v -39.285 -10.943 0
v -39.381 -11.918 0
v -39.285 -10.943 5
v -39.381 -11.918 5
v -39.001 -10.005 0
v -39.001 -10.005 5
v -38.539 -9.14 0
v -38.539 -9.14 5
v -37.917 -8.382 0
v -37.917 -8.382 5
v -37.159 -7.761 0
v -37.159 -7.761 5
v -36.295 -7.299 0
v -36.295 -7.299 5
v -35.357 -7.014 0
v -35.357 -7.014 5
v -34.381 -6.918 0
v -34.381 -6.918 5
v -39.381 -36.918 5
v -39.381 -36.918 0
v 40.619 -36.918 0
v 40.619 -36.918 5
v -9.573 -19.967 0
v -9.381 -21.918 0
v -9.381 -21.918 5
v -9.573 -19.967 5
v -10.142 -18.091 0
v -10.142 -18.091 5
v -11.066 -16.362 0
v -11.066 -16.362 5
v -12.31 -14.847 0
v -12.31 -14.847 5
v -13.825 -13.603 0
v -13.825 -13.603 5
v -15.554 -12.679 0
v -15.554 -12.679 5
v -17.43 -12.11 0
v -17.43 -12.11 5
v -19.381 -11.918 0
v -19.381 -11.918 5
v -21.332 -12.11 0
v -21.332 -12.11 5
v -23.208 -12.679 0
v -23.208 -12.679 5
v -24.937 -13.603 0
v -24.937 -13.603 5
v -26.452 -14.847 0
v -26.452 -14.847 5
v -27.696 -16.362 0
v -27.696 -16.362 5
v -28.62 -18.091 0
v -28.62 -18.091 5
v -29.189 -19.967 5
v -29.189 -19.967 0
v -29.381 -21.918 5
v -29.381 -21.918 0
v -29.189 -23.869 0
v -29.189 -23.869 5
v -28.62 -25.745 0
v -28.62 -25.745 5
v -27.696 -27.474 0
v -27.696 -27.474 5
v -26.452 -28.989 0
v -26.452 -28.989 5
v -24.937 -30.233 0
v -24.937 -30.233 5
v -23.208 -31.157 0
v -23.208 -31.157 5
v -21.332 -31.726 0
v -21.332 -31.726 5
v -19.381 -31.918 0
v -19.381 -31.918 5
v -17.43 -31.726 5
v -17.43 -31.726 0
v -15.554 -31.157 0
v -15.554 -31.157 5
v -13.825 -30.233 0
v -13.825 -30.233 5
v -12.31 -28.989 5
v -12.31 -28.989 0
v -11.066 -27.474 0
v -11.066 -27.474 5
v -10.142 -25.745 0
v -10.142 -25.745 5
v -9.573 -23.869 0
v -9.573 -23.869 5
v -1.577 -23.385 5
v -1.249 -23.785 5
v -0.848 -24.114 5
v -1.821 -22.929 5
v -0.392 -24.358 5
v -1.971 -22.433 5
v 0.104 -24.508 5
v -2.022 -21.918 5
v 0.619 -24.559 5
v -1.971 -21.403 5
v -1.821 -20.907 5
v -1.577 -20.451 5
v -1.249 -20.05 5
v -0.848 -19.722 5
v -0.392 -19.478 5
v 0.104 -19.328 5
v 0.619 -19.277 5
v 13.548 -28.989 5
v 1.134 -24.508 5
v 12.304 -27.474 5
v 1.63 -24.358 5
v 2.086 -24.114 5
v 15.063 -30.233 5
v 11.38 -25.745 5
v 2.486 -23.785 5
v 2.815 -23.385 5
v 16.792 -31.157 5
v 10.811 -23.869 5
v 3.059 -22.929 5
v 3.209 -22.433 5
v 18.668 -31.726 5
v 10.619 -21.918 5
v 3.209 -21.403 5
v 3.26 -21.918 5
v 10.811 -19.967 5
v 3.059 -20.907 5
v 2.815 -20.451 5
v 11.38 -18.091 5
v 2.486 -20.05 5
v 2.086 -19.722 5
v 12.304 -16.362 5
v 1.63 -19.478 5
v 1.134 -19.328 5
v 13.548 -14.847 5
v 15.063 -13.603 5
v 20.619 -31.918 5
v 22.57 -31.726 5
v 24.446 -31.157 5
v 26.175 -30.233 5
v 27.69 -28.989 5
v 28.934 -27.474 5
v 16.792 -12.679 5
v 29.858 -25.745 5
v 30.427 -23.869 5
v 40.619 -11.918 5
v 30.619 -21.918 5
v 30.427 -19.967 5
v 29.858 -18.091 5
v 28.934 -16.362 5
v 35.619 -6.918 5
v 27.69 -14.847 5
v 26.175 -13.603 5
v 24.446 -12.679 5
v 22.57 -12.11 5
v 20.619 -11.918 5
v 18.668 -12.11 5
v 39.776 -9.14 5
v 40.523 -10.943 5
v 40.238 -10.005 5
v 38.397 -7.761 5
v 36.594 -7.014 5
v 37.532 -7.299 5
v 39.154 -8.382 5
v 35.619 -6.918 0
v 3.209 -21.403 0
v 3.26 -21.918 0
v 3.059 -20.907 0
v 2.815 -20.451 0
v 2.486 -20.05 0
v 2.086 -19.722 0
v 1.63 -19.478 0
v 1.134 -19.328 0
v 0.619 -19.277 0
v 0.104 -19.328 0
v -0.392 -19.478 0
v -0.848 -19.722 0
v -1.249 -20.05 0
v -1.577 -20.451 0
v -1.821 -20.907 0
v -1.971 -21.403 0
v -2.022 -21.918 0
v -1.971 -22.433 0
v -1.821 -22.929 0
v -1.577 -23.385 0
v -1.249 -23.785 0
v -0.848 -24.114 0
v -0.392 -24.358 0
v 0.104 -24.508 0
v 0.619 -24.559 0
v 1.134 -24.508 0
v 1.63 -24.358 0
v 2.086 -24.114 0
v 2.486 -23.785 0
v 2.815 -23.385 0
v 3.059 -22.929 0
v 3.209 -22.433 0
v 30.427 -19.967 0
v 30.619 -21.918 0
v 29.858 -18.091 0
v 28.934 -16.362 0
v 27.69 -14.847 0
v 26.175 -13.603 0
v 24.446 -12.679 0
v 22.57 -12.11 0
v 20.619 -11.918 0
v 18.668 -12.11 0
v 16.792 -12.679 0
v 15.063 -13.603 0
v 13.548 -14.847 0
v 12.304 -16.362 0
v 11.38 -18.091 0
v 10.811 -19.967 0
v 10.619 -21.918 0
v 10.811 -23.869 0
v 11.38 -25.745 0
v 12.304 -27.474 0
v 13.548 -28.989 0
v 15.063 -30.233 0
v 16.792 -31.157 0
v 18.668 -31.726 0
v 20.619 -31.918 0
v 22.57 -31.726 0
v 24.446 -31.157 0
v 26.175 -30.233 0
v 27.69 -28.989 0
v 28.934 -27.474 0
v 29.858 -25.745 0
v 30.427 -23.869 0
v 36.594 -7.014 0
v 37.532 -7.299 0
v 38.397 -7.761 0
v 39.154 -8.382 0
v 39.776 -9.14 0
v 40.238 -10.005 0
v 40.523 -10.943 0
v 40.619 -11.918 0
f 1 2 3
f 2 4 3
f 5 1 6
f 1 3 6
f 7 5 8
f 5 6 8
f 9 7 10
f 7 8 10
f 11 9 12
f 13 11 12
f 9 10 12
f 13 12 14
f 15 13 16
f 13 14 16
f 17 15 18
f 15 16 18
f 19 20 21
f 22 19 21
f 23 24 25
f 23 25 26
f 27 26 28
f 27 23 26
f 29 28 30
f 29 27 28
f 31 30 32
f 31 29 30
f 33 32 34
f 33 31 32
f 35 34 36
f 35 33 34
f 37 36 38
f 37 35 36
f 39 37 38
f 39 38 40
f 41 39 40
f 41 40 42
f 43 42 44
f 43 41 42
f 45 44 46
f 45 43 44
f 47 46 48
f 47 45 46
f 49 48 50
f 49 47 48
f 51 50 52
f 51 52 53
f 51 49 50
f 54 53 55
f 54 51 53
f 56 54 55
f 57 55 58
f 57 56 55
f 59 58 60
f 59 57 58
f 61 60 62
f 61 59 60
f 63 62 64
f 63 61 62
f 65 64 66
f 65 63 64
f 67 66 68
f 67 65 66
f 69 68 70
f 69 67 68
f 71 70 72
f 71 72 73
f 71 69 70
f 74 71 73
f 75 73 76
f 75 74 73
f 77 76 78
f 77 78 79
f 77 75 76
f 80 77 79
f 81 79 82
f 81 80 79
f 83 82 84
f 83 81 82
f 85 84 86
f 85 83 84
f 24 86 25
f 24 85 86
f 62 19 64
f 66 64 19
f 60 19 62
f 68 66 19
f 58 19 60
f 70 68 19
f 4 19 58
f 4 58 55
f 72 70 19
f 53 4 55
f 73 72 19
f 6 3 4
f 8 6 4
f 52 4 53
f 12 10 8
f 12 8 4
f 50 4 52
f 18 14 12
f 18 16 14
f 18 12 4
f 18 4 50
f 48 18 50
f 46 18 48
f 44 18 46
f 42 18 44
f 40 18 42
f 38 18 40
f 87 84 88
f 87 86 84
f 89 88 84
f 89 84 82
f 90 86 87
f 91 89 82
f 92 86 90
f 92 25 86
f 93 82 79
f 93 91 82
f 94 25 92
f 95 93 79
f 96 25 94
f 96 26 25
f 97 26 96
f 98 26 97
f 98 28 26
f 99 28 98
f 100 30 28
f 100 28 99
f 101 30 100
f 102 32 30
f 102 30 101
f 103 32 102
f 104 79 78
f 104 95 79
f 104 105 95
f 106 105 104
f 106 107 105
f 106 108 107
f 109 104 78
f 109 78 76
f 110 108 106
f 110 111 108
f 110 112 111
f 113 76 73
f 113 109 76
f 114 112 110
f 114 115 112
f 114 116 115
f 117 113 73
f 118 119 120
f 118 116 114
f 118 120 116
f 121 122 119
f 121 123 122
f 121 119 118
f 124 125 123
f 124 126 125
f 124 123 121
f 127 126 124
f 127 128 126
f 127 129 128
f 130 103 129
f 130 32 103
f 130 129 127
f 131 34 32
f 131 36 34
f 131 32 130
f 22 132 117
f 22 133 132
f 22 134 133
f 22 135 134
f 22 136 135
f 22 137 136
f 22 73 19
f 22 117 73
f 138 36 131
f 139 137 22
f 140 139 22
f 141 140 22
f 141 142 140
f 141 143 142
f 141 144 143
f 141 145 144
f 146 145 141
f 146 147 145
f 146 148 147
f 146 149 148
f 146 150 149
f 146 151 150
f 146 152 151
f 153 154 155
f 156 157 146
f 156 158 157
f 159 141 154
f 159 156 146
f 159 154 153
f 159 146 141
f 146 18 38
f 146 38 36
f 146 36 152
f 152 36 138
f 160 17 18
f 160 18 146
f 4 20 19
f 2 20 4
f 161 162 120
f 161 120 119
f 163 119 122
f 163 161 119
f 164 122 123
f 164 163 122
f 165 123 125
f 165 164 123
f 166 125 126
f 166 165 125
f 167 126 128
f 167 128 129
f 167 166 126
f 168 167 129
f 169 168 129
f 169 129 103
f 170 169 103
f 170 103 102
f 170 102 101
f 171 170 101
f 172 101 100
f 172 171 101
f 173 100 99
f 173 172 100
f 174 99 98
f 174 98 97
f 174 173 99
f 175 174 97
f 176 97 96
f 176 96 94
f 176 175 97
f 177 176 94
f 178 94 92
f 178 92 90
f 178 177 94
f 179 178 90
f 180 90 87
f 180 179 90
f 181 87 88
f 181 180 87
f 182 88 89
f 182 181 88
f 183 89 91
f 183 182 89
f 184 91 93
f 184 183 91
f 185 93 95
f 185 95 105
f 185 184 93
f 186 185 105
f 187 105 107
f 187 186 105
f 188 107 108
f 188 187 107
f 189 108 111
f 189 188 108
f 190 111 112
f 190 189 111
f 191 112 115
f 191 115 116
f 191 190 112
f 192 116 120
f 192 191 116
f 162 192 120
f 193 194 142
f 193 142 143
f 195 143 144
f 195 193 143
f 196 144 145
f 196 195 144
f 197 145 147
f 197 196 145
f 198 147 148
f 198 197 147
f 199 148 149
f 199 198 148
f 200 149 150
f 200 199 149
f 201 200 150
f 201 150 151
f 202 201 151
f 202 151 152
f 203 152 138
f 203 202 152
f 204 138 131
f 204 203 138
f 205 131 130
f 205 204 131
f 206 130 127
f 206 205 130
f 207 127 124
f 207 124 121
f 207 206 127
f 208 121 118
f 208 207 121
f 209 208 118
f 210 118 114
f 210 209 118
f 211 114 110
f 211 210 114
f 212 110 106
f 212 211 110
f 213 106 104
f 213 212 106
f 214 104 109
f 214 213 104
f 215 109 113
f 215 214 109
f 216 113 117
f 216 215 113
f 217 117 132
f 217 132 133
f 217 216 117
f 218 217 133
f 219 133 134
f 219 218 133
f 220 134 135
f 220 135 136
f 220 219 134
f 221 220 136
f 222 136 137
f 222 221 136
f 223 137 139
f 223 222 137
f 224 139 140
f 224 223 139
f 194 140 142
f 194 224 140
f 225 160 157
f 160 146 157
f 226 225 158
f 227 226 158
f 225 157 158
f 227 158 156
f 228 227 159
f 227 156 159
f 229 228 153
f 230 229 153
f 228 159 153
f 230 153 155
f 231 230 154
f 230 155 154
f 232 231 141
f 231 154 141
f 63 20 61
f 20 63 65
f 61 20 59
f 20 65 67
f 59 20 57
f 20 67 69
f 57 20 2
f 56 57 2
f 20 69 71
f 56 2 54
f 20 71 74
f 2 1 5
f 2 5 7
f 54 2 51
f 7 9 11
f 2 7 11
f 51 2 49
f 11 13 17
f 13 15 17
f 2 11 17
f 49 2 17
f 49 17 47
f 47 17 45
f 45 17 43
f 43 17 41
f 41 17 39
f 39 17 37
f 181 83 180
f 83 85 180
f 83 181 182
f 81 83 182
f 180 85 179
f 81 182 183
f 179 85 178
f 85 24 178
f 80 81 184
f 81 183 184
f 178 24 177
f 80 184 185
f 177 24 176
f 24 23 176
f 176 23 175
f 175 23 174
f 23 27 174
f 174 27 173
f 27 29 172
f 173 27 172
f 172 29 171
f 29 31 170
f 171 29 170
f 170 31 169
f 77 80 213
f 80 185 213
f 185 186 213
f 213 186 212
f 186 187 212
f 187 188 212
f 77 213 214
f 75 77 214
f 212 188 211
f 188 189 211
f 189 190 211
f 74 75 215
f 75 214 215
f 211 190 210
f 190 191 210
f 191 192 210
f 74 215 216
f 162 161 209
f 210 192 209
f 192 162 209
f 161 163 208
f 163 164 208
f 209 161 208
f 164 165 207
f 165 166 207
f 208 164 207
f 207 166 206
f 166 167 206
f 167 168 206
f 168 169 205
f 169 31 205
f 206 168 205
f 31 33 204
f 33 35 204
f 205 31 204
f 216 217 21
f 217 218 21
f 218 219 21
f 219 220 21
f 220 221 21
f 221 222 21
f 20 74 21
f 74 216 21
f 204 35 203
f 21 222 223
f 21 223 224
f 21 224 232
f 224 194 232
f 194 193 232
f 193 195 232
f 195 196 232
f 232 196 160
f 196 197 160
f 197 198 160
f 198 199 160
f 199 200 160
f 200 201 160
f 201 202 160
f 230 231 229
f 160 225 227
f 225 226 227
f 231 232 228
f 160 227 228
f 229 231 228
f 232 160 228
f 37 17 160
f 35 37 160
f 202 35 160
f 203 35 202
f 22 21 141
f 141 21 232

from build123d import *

# Parameters (mm, degrees)
SKETCH2_W           = 80
SKETCH2_H           = 30
SKETCH2_R           = 10
SKETCH2_R_2         = 2.641043536
BOSS_EXTRUDE1_DEPTH = 5
FILLET2_R           = 5


with BuildPart() as part:
    # Sketch2 → Boss-Extrude1 (new body)
    with BuildSketch(Plane.XY):
        with Locations((0.618817107, -21.917958992)):
            Rectangle(SKETCH2_W, SKETCH2_H)
        with Locations((-19.381182893, -21.917958992)):
            Circle(SKETCH2_R, mode=Mode.SUBTRACT)
        with Locations((20.618817107, -21.917958992)):
            Circle(SKETCH2_R, mode=Mode.SUBTRACT)
        with Locations((0.618817107, -21.917958992)):
            Circle(SKETCH2_R_2, mode=Mode.SUBTRACT)
    extrude(amount=BOSS_EXTRUDE1_DEPTH)

    # Fillet2
    fillet2_edges = [part.edges().sort_by_distance(p)[0] for p in [
        (-39.381182893, -6.917958992, 2.5),
        (40.618817107, -6.917958992, 2.5),
    ]]
    fillet(fillet2_edges, radius=FILLET2_R)


solid = part.part
